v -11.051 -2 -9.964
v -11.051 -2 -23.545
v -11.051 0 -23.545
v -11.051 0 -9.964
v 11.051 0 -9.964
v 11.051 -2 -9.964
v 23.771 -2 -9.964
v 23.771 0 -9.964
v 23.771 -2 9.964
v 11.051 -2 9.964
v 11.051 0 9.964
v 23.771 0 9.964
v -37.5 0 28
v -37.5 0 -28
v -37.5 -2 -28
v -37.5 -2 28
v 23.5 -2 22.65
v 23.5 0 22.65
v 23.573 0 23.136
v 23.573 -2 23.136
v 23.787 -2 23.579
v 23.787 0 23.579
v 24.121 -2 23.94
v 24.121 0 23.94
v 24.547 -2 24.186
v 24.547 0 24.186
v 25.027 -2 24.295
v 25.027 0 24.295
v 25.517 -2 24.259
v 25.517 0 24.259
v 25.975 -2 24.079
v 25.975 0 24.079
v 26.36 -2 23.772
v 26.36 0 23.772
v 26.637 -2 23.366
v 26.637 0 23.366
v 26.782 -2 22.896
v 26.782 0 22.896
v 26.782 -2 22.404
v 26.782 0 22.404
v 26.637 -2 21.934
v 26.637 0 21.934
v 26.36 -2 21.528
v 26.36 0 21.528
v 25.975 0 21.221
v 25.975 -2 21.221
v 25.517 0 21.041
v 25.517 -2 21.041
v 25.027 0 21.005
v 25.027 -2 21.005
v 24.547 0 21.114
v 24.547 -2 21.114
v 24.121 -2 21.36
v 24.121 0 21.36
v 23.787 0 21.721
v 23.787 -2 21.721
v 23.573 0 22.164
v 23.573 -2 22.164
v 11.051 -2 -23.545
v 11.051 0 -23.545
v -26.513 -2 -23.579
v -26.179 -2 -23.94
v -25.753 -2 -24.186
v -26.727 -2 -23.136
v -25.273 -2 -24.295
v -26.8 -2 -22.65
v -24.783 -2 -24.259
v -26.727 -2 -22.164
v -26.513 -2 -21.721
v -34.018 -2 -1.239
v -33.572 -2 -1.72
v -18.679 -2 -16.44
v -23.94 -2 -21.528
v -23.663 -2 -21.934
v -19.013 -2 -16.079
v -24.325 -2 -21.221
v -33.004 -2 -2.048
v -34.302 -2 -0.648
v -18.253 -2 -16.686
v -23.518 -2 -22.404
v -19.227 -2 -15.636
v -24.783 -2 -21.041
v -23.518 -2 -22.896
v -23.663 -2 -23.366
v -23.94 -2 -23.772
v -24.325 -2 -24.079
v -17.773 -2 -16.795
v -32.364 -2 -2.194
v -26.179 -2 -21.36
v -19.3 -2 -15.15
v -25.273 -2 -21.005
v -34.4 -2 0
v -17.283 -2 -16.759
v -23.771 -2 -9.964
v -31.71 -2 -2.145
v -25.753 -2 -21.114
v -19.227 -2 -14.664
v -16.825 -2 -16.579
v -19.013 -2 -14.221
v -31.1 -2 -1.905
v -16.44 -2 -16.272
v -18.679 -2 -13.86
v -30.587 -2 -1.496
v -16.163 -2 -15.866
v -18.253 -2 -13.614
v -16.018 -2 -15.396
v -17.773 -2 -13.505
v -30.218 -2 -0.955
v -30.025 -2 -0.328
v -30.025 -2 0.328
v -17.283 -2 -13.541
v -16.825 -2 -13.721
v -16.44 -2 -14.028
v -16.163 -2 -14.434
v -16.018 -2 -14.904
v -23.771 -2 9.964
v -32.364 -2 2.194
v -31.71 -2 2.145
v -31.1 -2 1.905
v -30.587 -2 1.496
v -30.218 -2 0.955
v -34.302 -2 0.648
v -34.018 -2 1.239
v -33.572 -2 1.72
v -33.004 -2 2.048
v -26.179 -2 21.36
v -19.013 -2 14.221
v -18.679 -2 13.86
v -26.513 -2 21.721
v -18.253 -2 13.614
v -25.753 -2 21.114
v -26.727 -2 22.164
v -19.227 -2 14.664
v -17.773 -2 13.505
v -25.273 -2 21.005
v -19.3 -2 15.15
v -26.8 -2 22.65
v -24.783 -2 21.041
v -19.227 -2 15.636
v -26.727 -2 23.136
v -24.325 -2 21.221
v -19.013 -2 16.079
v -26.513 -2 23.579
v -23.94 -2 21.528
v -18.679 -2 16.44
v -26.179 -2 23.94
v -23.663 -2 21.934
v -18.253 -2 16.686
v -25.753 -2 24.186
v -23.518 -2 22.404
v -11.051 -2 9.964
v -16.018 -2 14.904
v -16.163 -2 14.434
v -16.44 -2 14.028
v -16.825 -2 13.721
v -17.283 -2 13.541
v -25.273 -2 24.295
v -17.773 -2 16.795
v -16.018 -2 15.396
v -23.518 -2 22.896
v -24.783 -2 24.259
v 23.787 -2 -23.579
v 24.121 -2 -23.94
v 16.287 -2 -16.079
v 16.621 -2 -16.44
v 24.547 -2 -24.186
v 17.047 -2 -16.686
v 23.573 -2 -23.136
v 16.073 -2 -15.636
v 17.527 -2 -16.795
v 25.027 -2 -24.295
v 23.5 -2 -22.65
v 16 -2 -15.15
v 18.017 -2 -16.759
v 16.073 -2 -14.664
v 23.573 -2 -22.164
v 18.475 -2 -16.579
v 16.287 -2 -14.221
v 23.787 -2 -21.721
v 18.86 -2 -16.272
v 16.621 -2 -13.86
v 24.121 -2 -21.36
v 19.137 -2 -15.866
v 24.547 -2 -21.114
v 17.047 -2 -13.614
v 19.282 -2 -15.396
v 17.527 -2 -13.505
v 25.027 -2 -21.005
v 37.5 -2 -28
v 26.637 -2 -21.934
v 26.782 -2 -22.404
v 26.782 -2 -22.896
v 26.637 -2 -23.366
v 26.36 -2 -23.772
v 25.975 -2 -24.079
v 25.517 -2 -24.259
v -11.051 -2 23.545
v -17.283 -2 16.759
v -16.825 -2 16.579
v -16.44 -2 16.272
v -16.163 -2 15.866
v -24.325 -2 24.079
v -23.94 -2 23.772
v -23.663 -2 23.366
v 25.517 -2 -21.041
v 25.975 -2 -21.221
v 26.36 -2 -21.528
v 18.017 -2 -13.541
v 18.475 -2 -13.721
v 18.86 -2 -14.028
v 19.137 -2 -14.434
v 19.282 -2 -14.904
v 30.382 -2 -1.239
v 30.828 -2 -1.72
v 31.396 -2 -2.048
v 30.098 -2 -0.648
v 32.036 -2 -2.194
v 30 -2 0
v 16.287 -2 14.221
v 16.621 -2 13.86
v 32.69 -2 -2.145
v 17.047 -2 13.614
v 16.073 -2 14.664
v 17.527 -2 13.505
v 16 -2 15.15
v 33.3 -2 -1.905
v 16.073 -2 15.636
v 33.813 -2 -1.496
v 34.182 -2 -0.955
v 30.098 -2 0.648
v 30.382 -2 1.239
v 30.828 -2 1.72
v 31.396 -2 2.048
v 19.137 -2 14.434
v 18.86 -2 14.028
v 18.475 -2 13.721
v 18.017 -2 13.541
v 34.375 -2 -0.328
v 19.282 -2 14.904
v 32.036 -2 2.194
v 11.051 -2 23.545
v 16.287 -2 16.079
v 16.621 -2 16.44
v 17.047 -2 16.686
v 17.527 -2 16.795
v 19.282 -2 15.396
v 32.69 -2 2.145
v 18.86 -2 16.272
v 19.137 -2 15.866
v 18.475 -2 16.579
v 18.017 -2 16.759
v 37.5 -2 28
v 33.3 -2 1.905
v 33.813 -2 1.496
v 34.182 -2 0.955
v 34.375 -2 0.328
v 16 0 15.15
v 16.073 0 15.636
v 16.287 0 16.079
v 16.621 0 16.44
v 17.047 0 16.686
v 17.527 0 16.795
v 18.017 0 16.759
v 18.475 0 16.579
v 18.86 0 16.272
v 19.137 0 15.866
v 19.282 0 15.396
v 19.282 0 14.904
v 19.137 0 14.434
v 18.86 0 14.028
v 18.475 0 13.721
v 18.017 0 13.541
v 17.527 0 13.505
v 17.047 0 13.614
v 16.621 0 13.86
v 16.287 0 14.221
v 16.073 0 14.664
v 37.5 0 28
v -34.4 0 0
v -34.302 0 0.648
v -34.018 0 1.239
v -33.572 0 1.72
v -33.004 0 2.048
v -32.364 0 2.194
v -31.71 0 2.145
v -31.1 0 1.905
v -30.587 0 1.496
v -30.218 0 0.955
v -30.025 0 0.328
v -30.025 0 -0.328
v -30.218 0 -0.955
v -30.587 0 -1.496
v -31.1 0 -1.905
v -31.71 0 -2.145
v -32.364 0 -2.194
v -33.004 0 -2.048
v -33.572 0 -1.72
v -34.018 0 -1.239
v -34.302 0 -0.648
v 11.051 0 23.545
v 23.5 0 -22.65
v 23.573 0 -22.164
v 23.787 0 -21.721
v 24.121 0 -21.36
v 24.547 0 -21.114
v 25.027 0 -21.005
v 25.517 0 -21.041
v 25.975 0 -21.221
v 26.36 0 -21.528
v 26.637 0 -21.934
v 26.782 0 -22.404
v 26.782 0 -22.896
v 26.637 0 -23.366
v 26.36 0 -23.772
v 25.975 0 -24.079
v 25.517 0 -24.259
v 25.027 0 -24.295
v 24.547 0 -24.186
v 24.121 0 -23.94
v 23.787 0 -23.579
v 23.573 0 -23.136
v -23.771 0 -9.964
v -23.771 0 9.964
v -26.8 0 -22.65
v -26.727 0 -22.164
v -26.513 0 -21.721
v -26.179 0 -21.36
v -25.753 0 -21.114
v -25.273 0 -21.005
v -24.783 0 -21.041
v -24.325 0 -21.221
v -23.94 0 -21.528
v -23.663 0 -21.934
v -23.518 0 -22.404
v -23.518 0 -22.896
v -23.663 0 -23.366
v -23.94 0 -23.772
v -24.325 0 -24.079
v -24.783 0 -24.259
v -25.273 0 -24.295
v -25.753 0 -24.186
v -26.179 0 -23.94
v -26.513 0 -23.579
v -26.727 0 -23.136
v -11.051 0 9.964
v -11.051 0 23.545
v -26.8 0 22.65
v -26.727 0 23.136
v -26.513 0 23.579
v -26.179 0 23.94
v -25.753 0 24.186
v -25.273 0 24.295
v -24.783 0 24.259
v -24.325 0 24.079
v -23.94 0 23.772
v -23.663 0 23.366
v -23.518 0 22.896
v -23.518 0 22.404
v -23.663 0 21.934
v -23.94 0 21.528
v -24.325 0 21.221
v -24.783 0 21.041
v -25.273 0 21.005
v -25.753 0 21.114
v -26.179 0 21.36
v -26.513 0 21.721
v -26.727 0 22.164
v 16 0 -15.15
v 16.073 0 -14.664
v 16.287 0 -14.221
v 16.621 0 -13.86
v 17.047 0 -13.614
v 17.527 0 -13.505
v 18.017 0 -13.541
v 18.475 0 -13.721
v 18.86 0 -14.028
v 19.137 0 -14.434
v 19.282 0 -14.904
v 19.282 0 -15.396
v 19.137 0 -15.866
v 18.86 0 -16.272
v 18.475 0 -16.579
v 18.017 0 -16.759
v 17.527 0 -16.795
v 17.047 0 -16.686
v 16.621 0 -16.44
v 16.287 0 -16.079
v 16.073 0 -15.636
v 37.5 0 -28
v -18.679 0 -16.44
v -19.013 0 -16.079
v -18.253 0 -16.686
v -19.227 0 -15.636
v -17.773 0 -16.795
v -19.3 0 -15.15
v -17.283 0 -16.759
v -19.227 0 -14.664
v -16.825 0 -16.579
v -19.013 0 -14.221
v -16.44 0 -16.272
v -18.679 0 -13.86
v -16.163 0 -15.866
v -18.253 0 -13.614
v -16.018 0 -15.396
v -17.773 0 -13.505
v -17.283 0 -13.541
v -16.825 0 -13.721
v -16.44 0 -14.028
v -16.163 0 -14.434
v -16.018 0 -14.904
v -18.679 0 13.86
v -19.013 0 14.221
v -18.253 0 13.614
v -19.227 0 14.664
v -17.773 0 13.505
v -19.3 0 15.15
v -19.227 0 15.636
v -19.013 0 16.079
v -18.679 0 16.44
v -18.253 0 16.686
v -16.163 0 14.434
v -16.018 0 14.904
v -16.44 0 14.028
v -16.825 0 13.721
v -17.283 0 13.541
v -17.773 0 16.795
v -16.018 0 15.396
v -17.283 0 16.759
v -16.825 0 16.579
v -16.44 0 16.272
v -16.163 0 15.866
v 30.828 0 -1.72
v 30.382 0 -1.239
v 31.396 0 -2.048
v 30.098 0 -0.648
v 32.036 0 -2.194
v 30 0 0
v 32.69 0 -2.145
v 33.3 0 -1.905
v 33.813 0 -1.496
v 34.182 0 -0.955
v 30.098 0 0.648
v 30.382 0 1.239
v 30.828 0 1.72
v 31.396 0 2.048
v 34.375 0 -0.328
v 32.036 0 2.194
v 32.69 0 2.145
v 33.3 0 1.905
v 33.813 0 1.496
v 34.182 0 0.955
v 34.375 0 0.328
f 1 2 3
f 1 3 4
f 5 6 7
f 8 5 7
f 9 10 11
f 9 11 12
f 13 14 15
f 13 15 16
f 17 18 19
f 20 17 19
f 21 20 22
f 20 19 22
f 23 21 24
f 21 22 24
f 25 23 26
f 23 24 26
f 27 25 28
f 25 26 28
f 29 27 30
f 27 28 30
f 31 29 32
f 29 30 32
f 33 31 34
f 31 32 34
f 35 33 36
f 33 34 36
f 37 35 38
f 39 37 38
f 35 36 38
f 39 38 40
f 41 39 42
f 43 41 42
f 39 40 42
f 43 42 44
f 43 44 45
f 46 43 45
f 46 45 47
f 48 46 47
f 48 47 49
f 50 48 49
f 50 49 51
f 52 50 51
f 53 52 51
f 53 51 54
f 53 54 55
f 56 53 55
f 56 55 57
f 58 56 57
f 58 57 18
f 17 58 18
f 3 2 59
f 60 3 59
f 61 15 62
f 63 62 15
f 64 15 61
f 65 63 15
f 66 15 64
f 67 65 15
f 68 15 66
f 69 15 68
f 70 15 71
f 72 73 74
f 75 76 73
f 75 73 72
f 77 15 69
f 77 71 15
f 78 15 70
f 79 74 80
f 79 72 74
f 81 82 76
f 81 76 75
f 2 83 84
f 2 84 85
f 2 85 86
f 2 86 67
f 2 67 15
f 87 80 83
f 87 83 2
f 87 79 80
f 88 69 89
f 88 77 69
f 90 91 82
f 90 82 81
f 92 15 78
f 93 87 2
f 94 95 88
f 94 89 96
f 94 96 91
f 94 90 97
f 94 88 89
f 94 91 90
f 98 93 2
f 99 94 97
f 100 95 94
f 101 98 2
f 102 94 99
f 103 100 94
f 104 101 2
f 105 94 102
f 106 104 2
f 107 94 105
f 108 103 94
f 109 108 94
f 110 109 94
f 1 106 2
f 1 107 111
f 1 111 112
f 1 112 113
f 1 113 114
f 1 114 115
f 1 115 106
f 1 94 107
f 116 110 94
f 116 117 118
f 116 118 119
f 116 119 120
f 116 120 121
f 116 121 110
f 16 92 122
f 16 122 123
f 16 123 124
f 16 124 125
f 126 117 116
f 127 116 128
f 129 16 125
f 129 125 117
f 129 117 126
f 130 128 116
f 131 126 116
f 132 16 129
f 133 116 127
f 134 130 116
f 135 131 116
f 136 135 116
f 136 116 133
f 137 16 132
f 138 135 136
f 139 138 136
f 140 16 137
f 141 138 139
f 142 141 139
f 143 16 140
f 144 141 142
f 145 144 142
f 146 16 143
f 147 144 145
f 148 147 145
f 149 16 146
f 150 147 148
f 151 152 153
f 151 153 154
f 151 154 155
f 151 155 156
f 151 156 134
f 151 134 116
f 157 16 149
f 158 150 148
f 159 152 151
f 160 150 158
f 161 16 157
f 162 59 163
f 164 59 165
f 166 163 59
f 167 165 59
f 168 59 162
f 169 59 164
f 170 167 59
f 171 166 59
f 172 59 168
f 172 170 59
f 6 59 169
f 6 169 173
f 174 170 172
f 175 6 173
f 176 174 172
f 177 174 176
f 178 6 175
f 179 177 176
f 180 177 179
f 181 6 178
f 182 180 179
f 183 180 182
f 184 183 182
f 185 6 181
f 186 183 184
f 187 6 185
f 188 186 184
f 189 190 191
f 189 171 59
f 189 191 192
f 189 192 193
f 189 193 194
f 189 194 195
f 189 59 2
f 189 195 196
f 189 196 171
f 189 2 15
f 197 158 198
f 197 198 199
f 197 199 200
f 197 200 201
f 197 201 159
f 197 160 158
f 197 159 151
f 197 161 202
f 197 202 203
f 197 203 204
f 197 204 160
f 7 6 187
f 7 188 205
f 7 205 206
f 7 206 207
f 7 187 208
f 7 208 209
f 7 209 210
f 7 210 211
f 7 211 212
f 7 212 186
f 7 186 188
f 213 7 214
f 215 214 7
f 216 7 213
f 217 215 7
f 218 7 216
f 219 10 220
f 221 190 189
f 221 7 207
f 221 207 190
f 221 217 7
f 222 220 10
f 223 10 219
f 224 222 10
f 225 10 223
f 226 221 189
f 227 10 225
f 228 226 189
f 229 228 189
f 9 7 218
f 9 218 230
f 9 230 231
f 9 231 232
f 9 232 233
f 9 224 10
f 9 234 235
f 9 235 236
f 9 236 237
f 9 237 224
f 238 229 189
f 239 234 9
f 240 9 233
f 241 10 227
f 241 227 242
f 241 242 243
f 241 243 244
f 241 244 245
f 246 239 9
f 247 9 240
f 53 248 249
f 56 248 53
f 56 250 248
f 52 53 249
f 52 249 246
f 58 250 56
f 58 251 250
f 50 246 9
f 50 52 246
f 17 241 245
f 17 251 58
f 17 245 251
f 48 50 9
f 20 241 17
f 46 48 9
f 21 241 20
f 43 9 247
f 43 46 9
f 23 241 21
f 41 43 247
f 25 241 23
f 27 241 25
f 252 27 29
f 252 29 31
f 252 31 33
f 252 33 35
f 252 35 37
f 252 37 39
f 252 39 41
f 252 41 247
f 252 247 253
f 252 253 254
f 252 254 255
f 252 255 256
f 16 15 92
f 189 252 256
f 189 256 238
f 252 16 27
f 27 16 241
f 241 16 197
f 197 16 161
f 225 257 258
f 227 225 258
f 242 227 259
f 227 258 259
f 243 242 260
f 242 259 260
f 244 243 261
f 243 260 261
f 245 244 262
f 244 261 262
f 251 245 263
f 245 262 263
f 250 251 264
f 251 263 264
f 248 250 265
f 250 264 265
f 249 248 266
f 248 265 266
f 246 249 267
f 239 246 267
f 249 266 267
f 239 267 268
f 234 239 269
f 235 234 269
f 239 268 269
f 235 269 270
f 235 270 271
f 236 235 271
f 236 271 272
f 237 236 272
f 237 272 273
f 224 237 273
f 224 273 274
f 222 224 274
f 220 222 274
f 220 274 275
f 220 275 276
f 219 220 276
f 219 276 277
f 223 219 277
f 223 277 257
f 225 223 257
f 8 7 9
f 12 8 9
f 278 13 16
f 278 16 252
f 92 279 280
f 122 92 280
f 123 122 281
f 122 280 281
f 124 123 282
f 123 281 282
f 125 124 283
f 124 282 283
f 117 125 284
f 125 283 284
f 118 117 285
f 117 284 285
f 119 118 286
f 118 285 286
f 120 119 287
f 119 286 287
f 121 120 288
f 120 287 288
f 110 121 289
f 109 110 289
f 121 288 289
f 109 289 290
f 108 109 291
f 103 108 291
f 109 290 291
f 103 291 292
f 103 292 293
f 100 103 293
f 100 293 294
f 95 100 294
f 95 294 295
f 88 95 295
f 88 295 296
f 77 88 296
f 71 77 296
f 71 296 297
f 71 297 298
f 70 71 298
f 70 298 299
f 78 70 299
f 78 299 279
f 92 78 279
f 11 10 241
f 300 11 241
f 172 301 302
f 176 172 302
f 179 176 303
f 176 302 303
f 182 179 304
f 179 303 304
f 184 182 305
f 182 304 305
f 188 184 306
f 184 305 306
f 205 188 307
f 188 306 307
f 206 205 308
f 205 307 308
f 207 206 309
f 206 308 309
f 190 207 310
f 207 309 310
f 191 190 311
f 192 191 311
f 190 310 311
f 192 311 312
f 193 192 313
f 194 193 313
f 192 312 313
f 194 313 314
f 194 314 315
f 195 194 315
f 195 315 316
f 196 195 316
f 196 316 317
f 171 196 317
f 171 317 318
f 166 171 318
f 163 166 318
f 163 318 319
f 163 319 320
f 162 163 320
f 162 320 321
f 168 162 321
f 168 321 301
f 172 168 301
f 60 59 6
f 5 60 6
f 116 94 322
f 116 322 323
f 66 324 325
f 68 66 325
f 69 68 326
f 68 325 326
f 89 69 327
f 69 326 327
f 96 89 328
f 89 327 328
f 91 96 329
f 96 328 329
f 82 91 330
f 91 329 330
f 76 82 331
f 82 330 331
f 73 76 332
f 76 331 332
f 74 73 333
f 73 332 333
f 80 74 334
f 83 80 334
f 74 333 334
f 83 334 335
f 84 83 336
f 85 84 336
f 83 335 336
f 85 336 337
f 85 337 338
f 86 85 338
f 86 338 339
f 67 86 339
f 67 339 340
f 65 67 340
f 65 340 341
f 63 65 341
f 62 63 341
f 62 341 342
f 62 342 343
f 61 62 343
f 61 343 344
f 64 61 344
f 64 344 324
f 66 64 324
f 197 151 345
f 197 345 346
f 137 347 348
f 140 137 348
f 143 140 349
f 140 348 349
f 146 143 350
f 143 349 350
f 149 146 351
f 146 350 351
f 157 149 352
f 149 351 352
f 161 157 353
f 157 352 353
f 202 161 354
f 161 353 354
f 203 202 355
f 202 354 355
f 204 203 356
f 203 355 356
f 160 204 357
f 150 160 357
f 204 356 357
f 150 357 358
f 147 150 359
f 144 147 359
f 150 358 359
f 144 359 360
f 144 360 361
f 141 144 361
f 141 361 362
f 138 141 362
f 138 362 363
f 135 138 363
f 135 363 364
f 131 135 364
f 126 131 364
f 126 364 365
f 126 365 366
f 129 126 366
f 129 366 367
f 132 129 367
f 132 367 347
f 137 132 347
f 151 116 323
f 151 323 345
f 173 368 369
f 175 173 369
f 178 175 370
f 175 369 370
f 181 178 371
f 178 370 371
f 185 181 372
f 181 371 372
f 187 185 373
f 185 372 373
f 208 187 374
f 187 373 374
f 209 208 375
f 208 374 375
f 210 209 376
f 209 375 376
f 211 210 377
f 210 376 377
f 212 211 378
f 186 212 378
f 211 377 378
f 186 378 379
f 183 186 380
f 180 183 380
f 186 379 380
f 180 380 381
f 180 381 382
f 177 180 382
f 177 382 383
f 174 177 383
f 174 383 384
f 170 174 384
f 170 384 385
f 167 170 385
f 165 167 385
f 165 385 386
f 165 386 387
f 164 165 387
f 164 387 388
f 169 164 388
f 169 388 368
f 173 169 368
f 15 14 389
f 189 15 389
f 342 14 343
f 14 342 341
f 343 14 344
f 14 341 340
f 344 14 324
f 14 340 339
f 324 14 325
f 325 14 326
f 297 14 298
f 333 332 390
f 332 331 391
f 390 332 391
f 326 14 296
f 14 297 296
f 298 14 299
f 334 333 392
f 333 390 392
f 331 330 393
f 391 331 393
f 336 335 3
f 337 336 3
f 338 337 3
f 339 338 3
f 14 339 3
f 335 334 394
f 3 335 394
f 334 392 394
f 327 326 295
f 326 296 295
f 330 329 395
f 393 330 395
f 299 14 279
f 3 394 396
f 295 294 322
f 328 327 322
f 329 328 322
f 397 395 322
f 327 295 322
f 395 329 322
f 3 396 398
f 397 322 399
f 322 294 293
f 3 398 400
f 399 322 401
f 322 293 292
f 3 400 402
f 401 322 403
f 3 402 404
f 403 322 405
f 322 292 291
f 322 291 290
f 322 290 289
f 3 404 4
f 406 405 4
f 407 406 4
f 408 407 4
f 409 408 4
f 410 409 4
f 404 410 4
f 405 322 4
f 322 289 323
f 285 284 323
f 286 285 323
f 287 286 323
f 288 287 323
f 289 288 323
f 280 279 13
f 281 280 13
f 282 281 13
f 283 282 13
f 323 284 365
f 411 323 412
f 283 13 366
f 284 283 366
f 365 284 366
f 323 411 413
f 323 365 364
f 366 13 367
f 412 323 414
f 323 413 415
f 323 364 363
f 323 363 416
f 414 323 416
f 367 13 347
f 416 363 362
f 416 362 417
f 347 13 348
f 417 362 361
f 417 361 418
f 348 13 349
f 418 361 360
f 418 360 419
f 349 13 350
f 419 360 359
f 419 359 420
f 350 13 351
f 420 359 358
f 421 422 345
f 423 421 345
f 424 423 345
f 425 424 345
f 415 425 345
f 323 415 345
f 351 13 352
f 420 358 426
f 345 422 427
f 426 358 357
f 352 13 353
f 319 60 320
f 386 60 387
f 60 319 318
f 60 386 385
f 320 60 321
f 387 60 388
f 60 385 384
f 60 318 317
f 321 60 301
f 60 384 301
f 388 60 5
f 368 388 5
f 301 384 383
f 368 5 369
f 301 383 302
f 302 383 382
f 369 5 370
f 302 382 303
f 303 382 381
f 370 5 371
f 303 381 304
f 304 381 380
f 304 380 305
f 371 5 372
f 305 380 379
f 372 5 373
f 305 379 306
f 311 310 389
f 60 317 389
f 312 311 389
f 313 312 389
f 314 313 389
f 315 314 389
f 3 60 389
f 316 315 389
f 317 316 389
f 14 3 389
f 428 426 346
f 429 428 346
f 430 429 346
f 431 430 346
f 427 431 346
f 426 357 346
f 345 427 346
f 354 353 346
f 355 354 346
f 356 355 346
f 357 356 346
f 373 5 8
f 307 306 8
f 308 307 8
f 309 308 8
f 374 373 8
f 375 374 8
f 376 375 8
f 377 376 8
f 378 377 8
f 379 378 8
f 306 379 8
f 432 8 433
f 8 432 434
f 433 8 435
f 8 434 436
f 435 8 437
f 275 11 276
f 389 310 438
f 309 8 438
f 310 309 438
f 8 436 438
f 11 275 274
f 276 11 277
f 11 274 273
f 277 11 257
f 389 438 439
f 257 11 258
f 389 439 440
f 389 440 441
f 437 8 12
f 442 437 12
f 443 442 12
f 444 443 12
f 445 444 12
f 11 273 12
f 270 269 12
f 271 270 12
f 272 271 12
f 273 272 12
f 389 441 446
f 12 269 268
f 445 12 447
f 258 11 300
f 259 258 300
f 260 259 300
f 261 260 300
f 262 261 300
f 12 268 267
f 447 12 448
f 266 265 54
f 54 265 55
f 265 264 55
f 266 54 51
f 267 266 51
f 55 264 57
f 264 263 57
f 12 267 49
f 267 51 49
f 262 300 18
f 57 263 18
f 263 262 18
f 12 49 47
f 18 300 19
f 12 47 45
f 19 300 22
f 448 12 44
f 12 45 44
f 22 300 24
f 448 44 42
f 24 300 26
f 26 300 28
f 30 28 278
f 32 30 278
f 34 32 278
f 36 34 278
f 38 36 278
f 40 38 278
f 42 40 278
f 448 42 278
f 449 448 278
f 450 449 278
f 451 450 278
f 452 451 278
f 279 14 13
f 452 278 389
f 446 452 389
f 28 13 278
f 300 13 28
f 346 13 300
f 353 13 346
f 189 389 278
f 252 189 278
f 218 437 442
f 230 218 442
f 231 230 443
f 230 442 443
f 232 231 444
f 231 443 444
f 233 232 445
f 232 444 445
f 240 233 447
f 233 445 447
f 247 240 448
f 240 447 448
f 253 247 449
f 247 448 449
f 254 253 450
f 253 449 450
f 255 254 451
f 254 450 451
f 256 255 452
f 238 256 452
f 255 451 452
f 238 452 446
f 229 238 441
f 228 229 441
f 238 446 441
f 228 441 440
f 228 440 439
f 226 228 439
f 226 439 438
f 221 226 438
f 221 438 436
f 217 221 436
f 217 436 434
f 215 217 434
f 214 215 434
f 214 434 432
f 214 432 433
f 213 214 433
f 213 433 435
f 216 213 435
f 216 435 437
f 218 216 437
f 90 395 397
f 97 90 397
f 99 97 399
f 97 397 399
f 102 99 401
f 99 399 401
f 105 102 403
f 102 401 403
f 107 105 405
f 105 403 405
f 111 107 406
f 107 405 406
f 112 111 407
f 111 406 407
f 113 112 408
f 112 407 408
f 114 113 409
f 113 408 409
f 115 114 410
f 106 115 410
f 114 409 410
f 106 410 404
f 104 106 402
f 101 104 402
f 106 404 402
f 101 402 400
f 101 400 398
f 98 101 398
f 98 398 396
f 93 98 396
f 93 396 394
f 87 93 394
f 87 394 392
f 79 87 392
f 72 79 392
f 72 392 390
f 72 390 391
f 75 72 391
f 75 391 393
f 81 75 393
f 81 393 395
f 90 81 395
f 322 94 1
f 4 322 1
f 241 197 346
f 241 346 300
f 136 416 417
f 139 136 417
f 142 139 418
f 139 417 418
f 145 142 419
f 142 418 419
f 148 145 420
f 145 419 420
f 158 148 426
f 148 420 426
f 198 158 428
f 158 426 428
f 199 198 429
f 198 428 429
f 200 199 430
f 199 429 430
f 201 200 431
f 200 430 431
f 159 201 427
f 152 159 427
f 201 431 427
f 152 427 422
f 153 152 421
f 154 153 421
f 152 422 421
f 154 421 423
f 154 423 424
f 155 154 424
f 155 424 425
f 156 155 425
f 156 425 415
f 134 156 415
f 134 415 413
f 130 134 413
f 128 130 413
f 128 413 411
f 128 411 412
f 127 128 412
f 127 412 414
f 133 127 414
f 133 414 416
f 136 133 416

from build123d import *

# Parameters (mm, degrees)
F0_W      = 75
F0_H      = 56
F1_DEPTH  = 2
F3_D      = 4.4
F5_D      = 3.3
F7_D      = 3.3
F8_W      = 47.5419834256
F8_H      = 19.9280381203
F9_DEPTH  = 25
F10_W     = 22.1011936665
F10_H     = 47.0907129347
F11_DEPTH = 25


with BuildPart() as f1:
    # F0 (on Front) → F1 (new body)
    with BuildSketch(Plane.XZ):
        Rectangle(F0_W, F0_H)
    extrude(amount=F1_DEPTH)

    # F3 (through all)
    with Locations(Plane.XZ.offset(2)):
        with Locations((-32.2, 0), (32.2, 0)):
            Hole(F3_D / 2)

    # F5 (through all)
    with Locations(Plane.XZ.offset(2)):
        with Locations((-25.15, 22.65), (-25.15, -22.65), (25.15, -22.65), (25.15, 22.65)):
            Hole(F5_D / 2)

    # F7 (through all)
    with Locations(Plane.XZ.offset(2)):
        with Locations((-17.65, 15.15), (-17.65, -15.15), (17.65, -15.15), (17.65, 15.15)):
            Hole(F7_D / 2)

    # F8 (on face) → F9 (cut)
    with BuildSketch(Plane.XZ.offset(2)):
        Rectangle(F8_W, F8_H)
    extrude(amount=-F9_DEPTH, mode=Mode.SUBTRACT)

    # F10 (on face) → F11 (cut)
    with BuildSketch(Plane.XZ.offset(2)):
        Rectangle(F10_W, F10_H)
    extrude(amount=-F11_DEPTH, mode=Mode.SUBTRACT)


solid = f1.part
